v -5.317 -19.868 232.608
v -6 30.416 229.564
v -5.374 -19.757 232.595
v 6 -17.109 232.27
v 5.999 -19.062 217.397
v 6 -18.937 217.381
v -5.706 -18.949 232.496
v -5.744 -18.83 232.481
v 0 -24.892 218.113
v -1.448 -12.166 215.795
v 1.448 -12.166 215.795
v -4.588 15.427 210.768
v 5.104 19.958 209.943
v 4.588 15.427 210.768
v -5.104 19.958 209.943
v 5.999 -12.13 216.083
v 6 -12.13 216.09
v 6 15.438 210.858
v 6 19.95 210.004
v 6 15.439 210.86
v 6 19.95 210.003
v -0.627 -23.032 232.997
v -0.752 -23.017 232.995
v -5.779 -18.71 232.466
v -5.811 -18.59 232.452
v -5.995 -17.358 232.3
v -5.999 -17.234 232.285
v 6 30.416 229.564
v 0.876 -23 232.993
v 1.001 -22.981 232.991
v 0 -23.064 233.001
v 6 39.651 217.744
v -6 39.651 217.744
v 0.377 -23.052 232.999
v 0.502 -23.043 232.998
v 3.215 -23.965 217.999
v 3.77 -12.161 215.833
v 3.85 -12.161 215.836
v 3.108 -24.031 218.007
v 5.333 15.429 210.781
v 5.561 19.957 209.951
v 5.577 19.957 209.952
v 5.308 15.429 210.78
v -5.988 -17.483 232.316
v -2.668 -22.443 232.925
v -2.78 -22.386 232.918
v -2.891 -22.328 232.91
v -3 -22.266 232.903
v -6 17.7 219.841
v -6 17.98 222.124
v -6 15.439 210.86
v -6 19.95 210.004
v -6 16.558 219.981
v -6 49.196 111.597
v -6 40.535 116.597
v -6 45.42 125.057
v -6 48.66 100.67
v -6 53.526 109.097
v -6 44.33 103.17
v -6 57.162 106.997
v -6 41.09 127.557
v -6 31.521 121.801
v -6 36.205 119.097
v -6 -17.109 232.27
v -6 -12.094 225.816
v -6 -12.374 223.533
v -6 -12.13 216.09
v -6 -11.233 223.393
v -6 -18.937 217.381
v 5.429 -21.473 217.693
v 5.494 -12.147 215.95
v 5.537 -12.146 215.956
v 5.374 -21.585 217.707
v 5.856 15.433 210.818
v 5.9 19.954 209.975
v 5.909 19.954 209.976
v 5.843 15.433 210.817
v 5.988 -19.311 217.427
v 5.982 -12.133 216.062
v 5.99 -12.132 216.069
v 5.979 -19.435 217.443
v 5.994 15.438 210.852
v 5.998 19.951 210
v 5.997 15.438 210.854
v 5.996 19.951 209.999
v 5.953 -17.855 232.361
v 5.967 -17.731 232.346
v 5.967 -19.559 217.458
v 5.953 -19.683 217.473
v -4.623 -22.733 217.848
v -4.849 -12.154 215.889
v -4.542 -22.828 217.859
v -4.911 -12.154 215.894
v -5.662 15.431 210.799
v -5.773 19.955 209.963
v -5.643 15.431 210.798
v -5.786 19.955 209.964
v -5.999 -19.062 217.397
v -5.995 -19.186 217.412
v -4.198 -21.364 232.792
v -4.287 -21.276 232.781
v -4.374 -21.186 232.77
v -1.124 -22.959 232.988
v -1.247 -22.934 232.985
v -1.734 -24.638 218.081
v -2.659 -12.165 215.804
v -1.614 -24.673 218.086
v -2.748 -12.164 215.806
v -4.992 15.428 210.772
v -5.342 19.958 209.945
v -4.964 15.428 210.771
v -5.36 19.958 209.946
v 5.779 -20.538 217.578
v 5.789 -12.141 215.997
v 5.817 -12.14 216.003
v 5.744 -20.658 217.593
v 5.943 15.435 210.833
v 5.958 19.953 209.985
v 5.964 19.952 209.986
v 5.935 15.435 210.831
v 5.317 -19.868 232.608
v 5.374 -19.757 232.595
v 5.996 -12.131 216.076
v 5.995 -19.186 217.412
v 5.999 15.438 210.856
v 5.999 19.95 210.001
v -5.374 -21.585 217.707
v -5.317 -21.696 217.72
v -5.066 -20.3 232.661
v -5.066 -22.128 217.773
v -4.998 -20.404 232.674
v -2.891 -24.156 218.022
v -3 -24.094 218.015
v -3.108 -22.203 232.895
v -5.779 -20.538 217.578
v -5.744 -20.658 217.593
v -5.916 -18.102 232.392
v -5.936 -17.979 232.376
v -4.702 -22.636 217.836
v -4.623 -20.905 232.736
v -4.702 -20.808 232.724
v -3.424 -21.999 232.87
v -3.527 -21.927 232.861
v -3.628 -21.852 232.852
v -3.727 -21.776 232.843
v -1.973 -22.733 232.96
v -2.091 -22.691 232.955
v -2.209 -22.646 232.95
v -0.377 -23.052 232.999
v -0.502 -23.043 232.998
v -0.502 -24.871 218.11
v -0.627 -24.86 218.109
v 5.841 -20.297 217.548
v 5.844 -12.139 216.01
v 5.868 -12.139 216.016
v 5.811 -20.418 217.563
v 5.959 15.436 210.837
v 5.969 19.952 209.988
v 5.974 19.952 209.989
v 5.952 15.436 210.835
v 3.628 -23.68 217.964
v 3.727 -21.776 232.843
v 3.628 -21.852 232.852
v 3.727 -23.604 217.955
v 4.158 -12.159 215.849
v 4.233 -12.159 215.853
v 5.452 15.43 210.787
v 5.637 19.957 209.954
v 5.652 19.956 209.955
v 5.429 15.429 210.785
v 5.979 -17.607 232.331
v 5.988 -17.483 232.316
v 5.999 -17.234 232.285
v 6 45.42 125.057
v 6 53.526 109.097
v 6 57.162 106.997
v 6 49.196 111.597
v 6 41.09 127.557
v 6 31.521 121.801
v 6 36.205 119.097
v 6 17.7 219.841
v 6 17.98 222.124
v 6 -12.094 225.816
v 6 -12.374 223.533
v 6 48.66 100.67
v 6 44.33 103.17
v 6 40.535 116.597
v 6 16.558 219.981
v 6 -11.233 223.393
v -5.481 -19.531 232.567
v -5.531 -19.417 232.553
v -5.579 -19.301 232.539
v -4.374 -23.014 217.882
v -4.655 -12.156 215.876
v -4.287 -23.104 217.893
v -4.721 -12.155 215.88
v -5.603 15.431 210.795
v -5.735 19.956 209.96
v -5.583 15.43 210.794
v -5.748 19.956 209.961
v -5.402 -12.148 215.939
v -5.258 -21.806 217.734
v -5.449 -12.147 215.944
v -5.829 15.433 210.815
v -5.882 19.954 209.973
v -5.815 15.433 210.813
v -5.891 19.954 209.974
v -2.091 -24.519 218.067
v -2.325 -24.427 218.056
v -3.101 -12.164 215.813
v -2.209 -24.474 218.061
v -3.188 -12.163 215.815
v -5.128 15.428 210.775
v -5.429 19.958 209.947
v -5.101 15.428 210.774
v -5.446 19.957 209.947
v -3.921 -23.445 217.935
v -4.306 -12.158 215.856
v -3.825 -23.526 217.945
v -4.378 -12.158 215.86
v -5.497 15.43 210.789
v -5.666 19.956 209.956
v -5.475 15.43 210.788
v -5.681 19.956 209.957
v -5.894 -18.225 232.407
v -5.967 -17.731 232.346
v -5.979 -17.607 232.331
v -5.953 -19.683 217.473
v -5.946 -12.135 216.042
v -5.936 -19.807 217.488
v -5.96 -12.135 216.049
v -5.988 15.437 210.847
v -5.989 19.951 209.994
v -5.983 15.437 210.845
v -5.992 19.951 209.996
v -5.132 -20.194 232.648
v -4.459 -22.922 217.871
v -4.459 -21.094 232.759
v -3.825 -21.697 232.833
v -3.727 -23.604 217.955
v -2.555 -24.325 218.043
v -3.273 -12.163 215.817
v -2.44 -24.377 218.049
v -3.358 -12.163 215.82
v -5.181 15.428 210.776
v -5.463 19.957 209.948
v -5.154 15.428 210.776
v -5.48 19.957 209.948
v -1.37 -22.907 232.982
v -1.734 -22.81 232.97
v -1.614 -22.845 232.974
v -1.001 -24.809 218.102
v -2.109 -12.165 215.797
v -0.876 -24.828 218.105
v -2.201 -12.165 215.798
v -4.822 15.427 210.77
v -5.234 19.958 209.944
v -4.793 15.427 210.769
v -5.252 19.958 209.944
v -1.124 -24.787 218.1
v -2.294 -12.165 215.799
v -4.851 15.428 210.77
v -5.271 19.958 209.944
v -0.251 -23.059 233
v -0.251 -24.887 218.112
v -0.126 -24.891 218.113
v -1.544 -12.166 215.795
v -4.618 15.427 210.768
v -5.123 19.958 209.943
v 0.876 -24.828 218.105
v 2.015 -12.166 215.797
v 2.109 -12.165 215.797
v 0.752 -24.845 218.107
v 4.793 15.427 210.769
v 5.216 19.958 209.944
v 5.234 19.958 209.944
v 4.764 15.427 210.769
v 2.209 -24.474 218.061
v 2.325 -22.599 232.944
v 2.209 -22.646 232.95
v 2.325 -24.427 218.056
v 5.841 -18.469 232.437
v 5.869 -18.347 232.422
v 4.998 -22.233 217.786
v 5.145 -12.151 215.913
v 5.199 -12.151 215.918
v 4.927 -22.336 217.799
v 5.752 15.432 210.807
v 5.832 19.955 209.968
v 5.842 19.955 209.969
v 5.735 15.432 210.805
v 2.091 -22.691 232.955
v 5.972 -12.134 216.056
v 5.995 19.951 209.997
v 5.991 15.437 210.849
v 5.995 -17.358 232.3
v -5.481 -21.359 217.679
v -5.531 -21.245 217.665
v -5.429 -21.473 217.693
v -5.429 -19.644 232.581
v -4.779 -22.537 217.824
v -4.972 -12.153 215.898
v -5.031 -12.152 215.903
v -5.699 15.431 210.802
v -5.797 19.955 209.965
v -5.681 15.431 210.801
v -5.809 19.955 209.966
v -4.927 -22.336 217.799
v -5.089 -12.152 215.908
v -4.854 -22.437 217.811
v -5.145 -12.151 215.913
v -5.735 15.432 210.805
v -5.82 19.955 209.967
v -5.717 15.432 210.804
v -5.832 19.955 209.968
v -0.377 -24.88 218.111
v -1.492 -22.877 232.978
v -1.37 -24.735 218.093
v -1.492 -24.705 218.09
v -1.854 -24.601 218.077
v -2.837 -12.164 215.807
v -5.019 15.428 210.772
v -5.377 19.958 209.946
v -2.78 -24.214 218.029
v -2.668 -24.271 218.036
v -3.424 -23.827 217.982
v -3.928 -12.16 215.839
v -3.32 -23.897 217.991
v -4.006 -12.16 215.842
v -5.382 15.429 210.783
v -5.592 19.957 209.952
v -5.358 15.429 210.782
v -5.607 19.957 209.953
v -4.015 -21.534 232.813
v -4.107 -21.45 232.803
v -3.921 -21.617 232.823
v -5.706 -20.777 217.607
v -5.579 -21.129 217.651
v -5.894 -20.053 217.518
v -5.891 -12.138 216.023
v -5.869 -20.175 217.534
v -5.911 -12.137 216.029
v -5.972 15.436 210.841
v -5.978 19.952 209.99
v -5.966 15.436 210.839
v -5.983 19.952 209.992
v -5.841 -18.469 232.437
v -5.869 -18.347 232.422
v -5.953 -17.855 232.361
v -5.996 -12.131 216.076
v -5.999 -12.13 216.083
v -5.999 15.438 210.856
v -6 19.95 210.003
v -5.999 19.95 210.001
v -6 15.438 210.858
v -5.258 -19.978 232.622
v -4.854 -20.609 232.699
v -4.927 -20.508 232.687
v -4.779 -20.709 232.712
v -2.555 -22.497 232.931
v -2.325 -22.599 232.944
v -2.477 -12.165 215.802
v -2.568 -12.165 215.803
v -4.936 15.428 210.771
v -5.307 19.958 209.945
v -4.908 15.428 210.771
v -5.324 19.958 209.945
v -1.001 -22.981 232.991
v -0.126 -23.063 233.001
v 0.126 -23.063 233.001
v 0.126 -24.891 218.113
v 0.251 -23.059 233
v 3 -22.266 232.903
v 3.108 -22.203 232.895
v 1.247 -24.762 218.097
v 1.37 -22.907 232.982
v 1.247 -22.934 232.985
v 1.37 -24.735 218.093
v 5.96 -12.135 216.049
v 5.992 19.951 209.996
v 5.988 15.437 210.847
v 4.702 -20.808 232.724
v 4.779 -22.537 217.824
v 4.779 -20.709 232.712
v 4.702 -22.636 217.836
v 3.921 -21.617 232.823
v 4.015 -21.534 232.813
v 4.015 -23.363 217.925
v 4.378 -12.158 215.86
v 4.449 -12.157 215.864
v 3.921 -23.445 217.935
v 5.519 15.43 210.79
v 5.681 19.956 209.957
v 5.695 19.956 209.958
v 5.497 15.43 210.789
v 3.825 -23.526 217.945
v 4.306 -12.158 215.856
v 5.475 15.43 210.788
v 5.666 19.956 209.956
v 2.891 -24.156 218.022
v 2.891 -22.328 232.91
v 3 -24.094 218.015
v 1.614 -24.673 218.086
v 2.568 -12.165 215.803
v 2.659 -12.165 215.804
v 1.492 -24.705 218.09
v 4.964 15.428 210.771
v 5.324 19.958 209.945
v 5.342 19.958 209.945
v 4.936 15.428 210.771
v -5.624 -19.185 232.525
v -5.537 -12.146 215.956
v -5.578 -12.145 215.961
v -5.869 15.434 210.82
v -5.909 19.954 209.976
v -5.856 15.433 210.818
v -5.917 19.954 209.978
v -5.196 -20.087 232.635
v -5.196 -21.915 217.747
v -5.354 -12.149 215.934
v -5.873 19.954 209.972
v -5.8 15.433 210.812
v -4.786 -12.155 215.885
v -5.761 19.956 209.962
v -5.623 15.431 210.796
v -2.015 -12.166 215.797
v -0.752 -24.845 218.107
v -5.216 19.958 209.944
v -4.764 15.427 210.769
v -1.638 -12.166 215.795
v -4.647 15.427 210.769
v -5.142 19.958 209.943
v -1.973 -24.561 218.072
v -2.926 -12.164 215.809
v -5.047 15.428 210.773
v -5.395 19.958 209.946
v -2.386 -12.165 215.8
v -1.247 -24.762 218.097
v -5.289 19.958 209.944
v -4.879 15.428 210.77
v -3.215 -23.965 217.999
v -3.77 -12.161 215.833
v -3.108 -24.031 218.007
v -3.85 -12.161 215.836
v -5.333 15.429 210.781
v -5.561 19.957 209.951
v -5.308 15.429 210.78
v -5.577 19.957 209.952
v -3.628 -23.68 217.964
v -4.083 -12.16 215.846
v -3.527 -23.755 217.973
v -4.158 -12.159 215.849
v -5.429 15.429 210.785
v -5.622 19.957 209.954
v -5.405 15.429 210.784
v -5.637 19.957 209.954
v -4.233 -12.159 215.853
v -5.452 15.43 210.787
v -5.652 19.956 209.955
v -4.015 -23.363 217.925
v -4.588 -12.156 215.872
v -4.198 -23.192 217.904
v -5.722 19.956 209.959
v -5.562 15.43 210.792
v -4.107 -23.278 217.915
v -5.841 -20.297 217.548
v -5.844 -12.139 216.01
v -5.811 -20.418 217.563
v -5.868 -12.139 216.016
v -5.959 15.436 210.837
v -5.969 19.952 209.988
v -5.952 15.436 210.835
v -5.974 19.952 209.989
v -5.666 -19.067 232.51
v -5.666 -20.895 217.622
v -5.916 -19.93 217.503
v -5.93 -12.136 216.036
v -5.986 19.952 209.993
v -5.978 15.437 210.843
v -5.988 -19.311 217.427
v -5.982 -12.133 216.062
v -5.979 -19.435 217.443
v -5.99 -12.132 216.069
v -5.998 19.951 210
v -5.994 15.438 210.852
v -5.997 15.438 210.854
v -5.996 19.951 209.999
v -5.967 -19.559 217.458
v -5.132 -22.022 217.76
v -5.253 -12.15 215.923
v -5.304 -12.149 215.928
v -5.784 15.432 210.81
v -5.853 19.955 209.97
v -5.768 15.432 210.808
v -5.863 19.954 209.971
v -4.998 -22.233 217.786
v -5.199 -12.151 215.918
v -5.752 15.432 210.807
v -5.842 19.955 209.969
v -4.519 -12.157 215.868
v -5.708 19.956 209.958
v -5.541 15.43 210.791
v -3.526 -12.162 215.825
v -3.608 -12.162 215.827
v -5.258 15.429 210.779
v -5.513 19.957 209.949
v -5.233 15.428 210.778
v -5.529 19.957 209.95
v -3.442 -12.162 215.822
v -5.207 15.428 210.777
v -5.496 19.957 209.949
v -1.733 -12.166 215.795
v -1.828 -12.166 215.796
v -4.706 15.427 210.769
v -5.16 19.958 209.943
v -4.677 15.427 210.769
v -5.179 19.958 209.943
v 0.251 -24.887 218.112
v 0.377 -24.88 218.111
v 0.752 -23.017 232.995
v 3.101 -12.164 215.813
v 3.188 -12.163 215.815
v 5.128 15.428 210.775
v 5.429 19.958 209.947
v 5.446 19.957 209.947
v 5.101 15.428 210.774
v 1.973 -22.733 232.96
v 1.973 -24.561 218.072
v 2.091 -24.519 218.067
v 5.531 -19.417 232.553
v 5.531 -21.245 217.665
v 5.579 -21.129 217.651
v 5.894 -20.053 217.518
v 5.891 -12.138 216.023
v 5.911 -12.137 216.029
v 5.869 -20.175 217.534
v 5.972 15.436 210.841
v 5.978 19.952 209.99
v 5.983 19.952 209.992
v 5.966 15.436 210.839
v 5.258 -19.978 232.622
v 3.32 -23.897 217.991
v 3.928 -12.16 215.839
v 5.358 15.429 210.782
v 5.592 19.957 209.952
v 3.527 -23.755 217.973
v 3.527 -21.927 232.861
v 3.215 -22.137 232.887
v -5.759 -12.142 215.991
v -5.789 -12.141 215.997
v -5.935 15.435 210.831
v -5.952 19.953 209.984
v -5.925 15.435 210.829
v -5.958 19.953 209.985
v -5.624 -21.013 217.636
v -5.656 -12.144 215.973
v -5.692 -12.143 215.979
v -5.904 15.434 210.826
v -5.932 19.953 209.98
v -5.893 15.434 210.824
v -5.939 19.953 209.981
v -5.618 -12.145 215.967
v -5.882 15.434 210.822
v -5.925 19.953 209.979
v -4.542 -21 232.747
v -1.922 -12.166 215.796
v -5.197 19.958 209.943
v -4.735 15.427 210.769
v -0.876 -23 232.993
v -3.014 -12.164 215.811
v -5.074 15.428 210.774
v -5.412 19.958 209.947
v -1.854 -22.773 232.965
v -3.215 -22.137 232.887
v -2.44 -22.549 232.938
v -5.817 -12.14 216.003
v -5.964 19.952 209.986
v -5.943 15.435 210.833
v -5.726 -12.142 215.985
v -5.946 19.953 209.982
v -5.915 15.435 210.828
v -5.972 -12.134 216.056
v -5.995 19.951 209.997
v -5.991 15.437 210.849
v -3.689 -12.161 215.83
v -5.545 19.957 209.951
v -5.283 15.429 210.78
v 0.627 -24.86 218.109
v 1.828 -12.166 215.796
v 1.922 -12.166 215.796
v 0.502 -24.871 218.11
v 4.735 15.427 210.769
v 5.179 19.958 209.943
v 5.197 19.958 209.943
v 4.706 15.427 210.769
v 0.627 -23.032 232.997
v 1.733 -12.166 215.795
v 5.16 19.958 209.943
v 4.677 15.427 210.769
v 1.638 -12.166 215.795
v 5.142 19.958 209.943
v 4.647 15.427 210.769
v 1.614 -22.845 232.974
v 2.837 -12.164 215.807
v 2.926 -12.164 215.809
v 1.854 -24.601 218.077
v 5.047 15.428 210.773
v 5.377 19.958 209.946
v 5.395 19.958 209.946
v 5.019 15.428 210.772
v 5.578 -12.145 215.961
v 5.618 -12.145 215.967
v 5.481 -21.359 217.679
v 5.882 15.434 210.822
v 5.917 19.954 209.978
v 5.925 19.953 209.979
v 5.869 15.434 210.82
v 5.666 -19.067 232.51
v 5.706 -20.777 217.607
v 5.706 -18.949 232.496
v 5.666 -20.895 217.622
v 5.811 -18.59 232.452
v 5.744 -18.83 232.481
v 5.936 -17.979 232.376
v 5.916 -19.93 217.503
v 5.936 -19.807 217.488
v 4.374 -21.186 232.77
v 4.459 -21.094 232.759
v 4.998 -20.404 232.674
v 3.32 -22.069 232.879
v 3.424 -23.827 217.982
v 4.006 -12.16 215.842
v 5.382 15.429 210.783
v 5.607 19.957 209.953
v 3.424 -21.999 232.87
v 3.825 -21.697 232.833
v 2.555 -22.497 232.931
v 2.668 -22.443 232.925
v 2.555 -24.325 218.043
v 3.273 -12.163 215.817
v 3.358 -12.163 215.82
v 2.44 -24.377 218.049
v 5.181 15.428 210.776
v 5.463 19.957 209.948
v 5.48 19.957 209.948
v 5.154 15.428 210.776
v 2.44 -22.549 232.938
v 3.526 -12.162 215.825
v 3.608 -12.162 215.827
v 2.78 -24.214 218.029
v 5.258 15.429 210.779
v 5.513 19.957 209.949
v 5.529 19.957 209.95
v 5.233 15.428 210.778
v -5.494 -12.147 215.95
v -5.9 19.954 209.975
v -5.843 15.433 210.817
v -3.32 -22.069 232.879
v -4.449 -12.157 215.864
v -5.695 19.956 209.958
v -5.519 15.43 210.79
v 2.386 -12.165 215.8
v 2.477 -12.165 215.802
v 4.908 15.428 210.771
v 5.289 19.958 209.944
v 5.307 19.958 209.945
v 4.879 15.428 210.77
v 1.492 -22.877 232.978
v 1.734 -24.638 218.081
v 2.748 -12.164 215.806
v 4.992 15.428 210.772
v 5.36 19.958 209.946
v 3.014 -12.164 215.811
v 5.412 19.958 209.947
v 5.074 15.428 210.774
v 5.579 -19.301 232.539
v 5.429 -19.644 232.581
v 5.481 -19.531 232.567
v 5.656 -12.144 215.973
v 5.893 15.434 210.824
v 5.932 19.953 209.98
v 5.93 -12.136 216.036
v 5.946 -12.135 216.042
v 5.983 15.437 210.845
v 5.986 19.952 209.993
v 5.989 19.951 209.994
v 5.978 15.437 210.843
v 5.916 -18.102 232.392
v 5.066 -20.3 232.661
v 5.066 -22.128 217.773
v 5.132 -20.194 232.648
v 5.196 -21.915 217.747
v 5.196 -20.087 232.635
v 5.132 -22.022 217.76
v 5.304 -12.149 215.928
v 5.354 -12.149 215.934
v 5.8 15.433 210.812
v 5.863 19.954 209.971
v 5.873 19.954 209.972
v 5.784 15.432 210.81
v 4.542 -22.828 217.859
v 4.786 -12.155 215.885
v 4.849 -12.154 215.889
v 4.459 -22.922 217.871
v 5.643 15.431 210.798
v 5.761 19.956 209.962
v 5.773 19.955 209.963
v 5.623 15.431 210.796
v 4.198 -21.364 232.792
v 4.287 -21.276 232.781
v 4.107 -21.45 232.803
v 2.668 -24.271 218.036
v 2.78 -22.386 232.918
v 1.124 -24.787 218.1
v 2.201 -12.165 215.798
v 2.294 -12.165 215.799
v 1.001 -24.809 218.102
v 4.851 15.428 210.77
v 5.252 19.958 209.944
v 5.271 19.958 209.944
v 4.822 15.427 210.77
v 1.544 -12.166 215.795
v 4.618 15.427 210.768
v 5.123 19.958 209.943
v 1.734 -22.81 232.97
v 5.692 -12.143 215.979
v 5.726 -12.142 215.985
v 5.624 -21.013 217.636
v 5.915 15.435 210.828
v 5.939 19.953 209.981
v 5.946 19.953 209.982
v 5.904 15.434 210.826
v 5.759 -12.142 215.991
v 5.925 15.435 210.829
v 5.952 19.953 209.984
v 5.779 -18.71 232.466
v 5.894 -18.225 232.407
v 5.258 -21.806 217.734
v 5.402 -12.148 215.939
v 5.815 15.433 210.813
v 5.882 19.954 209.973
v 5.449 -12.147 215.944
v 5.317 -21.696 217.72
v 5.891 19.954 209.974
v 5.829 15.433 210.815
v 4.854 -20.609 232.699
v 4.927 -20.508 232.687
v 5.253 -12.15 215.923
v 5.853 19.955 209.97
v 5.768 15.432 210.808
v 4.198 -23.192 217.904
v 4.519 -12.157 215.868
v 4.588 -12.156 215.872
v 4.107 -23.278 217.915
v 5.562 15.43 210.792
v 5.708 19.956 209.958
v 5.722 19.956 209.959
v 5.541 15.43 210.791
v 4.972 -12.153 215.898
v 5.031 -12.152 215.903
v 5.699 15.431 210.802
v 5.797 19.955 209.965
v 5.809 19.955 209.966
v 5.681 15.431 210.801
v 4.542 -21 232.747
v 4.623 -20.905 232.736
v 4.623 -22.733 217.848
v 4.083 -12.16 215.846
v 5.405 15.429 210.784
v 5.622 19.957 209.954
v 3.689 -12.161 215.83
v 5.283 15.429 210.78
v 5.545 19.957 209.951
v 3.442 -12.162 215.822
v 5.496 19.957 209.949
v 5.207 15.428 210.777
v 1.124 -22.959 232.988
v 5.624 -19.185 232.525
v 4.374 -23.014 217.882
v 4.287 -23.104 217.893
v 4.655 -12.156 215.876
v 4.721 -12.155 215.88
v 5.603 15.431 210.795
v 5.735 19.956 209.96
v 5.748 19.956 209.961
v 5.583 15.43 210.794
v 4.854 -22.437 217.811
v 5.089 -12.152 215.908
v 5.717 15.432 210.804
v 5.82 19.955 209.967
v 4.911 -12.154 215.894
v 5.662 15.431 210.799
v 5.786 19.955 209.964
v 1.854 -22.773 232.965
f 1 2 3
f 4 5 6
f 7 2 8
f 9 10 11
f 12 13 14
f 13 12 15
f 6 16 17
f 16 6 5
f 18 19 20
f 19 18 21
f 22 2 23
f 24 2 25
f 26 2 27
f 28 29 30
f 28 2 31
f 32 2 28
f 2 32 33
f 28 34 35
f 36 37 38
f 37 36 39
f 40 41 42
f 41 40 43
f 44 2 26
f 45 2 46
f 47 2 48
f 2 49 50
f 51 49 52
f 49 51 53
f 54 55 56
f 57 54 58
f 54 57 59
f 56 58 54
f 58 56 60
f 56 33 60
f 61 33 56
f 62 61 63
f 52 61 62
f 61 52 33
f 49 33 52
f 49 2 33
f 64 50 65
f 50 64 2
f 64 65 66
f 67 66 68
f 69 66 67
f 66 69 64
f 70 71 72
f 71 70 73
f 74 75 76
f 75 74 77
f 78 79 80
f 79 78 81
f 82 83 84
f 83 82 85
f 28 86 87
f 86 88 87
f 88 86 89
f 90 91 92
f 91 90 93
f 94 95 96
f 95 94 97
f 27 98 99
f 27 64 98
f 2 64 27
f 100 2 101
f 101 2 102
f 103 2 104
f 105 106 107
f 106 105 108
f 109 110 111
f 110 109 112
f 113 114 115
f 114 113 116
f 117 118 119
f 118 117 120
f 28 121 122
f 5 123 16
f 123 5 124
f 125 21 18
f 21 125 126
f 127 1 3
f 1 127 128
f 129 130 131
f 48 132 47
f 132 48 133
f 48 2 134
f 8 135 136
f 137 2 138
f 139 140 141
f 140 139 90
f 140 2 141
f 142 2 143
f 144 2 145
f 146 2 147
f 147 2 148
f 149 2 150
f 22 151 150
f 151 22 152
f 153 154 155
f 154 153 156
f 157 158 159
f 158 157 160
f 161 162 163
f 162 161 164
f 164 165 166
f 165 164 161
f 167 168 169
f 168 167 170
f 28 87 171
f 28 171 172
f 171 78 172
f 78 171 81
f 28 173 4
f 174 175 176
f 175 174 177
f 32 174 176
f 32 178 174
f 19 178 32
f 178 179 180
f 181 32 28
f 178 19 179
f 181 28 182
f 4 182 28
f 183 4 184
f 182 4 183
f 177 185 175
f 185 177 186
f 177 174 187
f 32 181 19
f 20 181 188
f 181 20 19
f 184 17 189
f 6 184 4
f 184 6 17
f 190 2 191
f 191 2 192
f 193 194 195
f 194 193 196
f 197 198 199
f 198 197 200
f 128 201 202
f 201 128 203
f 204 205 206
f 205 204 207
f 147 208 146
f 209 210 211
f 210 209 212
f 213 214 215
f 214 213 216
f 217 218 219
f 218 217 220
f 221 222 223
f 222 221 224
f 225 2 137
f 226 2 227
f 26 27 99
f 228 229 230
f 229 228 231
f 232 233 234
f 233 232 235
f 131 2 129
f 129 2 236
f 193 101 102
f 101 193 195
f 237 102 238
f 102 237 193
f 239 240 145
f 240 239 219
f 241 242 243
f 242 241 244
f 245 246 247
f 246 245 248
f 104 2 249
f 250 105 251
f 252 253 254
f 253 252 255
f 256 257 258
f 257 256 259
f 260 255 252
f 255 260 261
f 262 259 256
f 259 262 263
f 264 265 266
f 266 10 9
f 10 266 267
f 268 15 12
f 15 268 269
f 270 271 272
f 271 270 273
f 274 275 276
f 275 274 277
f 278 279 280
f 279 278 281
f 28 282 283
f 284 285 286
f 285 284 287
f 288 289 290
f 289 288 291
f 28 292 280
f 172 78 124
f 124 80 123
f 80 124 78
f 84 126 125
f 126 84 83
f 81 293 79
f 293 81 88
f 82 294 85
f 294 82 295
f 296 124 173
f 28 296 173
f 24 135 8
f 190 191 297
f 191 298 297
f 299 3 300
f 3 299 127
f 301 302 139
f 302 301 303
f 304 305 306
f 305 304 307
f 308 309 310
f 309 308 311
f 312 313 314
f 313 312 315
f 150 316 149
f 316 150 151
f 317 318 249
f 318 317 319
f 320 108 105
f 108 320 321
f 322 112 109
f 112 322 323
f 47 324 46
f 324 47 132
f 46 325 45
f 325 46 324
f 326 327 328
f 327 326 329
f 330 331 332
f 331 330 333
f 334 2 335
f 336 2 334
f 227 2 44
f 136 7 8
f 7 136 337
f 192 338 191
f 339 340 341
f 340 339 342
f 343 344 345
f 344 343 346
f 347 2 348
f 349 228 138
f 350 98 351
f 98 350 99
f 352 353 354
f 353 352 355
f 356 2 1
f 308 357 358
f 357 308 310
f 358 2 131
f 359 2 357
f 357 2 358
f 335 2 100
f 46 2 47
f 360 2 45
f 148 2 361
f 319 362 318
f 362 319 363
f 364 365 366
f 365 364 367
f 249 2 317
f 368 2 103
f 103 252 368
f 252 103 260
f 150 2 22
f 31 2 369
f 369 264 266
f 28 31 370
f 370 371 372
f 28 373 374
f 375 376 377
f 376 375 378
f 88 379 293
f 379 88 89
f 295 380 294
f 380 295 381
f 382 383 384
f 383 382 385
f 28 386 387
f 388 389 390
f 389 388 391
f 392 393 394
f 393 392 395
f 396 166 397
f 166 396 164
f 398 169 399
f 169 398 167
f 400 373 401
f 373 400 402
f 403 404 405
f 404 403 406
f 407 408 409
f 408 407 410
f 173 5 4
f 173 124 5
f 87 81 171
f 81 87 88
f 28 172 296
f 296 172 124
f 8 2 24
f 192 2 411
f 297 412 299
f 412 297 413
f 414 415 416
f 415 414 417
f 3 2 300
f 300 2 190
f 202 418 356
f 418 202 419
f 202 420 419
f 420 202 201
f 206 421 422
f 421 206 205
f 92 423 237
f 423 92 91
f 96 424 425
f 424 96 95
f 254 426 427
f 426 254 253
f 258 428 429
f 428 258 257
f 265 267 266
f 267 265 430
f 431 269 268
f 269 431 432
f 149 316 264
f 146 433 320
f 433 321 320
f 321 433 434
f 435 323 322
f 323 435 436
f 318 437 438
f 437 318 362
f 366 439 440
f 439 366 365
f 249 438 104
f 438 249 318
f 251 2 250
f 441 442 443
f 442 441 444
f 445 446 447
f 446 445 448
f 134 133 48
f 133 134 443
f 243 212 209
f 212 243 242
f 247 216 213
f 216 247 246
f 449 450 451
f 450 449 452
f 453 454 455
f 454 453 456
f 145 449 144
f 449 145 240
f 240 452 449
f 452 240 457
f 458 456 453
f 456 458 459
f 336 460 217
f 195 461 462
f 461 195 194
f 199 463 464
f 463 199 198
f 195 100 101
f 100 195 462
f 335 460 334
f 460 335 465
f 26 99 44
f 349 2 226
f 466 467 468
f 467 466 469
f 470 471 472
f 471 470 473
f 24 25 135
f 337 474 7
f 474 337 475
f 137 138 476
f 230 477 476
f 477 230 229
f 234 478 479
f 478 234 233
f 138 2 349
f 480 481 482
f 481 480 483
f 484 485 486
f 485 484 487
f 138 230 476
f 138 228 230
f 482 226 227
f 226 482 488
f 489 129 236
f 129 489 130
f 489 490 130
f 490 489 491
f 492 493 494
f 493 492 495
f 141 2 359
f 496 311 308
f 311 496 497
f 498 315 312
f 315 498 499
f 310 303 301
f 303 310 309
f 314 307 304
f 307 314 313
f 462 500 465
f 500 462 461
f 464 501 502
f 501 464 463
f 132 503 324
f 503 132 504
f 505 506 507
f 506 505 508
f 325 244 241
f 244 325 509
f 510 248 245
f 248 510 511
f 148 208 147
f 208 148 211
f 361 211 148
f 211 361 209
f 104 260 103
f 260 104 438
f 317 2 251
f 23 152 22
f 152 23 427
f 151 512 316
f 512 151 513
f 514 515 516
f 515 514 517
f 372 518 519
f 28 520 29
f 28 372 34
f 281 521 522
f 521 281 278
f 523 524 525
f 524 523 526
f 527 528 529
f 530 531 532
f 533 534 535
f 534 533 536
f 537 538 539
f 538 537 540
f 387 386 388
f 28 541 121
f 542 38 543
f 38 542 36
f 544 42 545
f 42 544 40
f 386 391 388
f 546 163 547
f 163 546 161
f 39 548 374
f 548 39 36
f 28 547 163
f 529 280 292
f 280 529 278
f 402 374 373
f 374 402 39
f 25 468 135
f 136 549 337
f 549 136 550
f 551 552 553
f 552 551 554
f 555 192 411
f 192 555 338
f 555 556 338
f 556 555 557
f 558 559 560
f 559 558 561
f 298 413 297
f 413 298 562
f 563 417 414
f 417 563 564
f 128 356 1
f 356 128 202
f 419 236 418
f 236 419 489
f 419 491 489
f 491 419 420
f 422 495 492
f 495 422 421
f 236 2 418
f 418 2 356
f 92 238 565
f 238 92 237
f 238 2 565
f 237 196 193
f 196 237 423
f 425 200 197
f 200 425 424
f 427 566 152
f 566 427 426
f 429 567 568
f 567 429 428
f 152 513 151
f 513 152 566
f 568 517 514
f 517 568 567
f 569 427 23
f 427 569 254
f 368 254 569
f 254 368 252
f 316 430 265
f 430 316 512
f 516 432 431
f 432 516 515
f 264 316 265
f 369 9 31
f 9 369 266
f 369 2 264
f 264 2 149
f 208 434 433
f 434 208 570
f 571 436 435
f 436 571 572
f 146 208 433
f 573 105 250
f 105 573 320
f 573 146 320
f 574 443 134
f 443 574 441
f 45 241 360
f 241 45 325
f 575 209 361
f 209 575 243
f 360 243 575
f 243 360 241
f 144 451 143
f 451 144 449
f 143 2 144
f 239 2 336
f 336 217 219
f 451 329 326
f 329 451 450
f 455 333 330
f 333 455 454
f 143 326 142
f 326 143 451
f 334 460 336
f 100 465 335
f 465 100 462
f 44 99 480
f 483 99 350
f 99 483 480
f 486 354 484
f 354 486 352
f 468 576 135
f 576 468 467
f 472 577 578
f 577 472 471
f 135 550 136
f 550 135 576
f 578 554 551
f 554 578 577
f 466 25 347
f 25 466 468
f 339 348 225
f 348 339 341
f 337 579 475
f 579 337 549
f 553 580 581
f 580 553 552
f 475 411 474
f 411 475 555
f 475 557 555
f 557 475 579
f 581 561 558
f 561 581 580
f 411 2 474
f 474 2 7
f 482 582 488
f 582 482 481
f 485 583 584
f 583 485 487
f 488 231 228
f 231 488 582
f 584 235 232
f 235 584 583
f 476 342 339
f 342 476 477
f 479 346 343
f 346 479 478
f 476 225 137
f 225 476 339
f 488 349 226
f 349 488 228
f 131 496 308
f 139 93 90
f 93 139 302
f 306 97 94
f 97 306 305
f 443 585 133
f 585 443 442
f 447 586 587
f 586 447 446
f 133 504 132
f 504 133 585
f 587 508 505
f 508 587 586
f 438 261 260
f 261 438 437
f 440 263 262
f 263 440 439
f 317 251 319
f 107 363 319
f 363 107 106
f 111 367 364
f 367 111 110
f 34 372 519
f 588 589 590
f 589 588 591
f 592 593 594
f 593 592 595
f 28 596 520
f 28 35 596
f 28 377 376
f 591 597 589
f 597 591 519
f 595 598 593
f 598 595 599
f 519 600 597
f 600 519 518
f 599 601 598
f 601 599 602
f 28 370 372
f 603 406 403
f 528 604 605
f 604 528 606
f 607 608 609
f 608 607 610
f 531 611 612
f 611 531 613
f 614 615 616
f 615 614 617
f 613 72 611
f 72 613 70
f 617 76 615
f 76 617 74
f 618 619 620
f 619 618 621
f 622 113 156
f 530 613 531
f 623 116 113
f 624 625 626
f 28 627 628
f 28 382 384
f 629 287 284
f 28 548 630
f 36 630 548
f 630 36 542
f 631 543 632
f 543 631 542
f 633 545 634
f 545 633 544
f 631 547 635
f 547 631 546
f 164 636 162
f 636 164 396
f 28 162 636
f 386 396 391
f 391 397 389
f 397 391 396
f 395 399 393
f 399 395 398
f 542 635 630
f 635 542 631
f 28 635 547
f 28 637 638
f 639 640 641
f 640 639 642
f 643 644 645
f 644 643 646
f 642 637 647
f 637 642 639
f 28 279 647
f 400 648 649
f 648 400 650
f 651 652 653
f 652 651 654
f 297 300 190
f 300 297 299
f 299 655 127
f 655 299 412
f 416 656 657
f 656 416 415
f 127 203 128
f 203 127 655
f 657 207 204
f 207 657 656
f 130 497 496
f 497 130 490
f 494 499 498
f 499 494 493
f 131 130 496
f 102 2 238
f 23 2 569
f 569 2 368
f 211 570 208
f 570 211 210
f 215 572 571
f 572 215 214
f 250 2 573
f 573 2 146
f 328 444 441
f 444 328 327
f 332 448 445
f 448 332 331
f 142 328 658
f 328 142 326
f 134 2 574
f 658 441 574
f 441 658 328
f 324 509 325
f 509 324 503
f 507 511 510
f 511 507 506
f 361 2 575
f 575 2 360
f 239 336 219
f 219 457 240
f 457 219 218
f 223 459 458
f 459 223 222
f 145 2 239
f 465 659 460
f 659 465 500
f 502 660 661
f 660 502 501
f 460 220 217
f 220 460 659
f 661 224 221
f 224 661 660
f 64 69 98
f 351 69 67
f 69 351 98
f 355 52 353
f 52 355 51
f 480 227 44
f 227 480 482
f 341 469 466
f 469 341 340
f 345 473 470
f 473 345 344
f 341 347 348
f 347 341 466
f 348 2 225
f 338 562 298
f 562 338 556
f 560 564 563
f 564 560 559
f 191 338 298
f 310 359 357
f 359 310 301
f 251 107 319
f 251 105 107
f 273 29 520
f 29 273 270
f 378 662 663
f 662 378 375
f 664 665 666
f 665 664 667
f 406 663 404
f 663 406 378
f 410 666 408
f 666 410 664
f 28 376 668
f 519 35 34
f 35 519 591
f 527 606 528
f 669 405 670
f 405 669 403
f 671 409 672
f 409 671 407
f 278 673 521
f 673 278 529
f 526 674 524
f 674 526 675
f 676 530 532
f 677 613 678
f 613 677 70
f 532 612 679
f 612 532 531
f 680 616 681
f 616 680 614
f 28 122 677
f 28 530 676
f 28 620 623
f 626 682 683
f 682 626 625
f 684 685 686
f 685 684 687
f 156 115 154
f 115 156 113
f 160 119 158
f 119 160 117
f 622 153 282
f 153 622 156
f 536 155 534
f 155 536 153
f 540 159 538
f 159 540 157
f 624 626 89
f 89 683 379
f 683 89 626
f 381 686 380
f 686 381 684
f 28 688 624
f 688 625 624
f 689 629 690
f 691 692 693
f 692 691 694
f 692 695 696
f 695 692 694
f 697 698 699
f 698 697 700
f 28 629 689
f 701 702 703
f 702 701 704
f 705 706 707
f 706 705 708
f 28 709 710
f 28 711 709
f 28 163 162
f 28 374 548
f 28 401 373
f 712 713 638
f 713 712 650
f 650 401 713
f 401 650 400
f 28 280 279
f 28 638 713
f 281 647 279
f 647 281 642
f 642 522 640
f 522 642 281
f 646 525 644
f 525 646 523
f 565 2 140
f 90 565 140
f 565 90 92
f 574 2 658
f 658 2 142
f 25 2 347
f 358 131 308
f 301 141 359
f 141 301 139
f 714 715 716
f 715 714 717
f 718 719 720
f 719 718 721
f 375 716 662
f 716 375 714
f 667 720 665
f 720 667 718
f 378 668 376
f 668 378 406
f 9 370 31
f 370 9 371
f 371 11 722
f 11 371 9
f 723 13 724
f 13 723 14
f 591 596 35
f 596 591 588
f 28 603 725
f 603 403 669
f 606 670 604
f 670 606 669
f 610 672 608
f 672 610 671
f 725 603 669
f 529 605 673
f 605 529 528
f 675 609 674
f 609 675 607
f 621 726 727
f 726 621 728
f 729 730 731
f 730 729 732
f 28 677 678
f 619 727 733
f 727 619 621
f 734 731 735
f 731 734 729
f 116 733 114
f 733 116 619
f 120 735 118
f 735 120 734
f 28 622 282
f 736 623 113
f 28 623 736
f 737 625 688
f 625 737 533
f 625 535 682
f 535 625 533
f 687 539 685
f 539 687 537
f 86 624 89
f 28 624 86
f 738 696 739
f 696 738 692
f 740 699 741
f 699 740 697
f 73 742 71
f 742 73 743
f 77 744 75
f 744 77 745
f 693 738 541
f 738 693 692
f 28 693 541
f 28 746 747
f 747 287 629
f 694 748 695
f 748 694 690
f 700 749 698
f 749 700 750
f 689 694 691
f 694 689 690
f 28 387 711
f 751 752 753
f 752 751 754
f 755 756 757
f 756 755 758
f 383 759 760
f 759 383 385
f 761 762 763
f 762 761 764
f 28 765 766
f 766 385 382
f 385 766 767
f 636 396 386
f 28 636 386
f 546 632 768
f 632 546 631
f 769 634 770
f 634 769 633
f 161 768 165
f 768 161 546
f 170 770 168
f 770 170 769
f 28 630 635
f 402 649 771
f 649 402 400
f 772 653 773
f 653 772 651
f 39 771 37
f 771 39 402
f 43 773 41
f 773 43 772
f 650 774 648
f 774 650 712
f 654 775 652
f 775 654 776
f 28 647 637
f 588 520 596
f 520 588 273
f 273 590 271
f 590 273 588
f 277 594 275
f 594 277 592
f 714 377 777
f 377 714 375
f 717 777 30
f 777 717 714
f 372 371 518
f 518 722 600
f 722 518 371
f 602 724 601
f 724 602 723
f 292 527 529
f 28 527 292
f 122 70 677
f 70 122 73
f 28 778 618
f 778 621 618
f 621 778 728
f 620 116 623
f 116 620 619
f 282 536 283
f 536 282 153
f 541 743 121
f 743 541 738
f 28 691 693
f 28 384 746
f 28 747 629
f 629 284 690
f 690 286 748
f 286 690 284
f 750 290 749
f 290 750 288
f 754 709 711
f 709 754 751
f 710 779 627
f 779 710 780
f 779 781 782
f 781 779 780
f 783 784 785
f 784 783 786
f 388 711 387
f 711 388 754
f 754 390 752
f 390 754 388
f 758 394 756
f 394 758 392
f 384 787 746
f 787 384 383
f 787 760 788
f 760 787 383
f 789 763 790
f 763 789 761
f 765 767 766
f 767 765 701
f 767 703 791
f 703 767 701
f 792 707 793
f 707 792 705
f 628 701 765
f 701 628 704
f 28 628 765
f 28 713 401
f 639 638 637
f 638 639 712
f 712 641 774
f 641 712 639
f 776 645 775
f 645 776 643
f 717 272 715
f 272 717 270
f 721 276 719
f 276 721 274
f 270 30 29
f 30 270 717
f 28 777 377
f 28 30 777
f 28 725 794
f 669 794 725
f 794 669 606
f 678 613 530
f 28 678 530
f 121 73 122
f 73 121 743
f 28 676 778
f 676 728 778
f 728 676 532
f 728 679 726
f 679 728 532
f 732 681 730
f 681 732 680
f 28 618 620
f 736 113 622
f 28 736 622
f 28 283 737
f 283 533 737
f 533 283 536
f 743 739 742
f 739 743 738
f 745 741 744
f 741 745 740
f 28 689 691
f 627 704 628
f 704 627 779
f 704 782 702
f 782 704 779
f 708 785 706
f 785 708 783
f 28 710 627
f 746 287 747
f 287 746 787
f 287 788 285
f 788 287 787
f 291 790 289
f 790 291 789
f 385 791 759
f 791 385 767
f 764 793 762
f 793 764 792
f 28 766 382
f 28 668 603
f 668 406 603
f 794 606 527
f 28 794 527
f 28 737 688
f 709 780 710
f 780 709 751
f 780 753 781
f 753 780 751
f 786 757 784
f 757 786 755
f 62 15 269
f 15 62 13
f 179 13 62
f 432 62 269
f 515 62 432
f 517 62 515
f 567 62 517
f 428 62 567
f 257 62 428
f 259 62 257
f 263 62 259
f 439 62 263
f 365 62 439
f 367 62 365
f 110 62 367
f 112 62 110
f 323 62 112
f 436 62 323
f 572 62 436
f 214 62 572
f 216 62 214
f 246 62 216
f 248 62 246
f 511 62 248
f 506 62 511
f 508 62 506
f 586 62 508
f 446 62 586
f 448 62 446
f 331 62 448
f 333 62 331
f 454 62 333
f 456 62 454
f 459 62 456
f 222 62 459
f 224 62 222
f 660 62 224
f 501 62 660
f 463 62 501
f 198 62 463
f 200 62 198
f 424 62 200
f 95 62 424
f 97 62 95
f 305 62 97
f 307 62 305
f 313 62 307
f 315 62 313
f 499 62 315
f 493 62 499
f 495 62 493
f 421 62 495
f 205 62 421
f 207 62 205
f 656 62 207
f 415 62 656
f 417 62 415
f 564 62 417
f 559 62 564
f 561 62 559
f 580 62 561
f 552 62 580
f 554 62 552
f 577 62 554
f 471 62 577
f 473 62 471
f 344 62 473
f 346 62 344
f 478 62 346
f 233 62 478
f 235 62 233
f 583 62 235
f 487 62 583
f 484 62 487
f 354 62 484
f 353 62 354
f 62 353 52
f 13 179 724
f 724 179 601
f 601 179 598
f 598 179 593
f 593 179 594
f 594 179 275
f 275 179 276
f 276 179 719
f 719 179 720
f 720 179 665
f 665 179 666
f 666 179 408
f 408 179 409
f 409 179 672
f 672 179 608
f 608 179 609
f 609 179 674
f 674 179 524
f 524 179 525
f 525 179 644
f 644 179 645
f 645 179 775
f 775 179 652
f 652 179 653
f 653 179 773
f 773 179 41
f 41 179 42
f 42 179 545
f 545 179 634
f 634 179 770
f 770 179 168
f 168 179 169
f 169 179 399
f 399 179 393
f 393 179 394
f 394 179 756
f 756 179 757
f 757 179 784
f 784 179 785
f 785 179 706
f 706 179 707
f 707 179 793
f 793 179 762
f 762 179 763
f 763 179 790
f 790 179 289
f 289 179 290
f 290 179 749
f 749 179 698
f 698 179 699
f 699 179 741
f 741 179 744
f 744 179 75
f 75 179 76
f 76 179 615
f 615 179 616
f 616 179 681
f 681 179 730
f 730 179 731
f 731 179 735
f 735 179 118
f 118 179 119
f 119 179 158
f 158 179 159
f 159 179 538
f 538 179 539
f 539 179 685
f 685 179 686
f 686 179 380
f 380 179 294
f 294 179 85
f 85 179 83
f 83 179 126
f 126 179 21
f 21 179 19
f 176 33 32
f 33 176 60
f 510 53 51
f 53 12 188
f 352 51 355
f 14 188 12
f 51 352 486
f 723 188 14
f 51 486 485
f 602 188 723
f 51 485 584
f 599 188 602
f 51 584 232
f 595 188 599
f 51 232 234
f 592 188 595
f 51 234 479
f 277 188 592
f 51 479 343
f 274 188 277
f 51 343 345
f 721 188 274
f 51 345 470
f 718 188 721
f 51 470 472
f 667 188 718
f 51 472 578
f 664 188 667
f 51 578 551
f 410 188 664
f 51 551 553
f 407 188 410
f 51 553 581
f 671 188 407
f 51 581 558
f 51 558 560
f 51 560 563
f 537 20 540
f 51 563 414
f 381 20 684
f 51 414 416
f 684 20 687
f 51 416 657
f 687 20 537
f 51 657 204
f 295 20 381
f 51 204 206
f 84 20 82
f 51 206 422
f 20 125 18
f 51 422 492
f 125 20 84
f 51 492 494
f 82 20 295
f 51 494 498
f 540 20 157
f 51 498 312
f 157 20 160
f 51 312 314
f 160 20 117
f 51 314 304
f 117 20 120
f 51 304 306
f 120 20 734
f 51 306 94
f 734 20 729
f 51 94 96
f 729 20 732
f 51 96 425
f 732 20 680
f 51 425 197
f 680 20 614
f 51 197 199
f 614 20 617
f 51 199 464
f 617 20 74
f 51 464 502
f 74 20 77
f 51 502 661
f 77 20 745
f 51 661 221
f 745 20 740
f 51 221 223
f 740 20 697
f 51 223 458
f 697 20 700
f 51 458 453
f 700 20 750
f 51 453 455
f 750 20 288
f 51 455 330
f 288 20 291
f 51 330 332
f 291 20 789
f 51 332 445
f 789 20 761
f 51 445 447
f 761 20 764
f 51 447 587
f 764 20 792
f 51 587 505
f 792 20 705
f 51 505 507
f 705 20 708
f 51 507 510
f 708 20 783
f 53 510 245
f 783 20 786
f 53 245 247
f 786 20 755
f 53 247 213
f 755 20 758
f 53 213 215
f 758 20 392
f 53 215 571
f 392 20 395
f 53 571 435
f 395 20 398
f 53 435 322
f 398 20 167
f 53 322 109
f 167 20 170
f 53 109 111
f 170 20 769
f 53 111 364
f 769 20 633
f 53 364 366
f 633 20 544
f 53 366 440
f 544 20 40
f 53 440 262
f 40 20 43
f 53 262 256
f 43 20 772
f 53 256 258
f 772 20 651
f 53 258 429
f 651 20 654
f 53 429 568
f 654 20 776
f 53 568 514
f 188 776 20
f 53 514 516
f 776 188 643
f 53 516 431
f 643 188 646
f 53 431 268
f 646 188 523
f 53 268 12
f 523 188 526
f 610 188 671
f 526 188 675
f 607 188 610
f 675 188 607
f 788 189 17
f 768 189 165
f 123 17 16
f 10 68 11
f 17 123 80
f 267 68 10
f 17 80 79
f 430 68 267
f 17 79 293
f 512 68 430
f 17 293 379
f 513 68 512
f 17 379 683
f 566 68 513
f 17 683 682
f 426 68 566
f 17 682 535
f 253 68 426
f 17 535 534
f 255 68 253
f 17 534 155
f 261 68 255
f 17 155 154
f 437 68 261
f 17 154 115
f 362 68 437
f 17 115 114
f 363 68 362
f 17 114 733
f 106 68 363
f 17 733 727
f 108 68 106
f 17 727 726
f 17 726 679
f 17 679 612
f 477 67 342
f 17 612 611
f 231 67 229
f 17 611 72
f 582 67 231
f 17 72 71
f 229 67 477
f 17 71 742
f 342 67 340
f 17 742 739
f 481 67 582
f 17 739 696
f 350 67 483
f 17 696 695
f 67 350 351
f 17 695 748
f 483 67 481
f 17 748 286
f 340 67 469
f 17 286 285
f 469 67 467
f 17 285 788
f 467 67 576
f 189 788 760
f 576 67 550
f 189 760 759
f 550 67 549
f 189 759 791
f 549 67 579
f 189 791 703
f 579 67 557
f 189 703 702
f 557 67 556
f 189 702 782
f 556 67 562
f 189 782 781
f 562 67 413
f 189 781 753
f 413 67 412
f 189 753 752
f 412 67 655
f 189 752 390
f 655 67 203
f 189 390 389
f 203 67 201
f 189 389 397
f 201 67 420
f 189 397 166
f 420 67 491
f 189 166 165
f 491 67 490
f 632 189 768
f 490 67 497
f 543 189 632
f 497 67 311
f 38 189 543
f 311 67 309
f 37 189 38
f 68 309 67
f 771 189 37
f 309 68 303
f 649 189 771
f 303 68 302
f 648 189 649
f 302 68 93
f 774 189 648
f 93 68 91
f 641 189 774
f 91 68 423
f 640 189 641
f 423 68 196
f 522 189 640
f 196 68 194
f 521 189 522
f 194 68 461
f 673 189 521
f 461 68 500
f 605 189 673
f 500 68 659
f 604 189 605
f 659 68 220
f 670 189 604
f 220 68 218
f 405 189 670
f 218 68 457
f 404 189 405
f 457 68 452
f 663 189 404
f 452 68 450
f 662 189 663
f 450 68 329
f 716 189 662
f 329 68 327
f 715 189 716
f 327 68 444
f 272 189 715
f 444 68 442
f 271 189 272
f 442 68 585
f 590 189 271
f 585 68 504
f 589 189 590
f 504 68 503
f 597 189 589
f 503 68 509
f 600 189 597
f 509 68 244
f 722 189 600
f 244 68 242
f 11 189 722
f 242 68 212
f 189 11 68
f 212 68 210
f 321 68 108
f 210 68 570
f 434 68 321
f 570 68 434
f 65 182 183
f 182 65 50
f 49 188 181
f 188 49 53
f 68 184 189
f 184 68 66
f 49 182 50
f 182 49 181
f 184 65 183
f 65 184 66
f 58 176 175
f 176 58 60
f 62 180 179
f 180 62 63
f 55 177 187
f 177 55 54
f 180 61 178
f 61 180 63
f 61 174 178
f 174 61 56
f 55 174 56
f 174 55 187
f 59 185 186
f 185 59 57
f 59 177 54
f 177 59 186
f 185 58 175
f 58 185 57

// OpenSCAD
$fn=100;

if($preview){
  translate([0,100,0])torii();
  translate([0,-100,0])street();
}else{
  // Put parts for 3D printing here and press F6
  $fn=300;
  cutter(1,140,-30);
}

// Assemblies
// Streetlamp style stand
module street(){
  color("Gainsboro")translate([0,0,200])rotate([-7,0,0])rolfstorp();
  for(i=[-1:2:1]){
    color("DarkOliveGreen")translate([140*i,0,0])street_stand();
  }
}

// Torii style stand
module torii(){
  color("Gainsboro")translate([0,0,120])rolfstorp();
  for(i=[-1:2:1]){
    color("MediumVioletRed")translate([140*i,0,0])torii_stand();
  }
}

// Helper
// 3D print splitter
module cutter(side=0,cuth=0,cuta=0){
  difference(){
  street_stand();
    union(){
      translate([0,0,cuth])rotate([cuta+180*side,0,0])translate([-500/2,-500/2,0])cube([500,500,500]);
    }
    translate([-12/2,40+5/2,cuth-30])rotate([cuta+180*side,0,0])translate([0,5,-5-9.5*side])cube([12,5,10]);
  }
  translate([-12/2,40+5/2,cuth-30])rotate([cuta+180*side,0,0])translate([0,-10,4.5-9.5*side])cube([12,5,10]);
}

// Parts
// Steetlamp style
module street_stand(){
  t=12;
  h=200;
  difference(){
    union(){
      // upper body
      hull(){
        translate([0,0,h+15/2])rotate([-7,0,0])translate([0,0,15])cube([t,40,15],center=true);
        translate([0,0,h+15/2])rotate([-7,0,0])translate([0,-20,7.5])cylinder(d=t,h=15);
        translate([0,0,h+15/2])rotate([-7,0,0])translate([0,40/2+15/2,15])rotate([-45,0,0])cube([t,15,15],center=true);
      }
      // neck
      hull(){
        translate([0,0,h+15/2])rotate([-7,0,0])translate([0,40/2+15/2,15])rotate([-45,0,0])cube([t,15,15],center=true);
        translate([0,60,10/2])cube([t,25,10],center=true);
      }
      hull(){
        translate([0,-5,0])cylinder(d=t,h=10);
        translate([0,80,0])cylinder(d=t,h=10);
      }
    }union(){
      // upper body cutout
      translate([0,0,h])rotate([-7,0,0])union(){
        translate([0,0,24/2])cube([t+2,28,24.1],center=true);
        translate([0,0,-2/2+24])cube([t+2,30.3,2.3],center=true);
      }
      for(i=[-1:2:1]){
        translate([0,i*177/2+10*i,14/2+h+15+5])rotate([i*-10,0,0])cube([t+2,20,32],center=true);
      }
    }
  }
}

// Torii style
module torii_stand(){
  t=25;
  h=120;
  difference(){
    union(){
      // upper body
      translate([0,0,8/2+h])cube([t,170,8],center=true);
      translate([0,0,14/2+h+15])cube([t,170,14],center=true);
      for(i=[-1:2:1]){
        translate([0,i*65/2+22*i,14/2+h+15+5])rotate([i*5,0,0])cube([t,90,10],center=true);
        translate([0,17*i,h+11.5])cube([t,6,9],center=true);
      }
      translate([0,0,14/2+h+15])cube([t,200,14],center=true);
      // stands
      for(i=[-1:2:1]){
        translate([0,55*i,(h+15)/2])cube([t,12,h+15],center=true);
        translate([0,55*i,8/2])cube([t,36,8],center=true);
      }
    }union(){
      // upper body cutout
      translate([0,0,24/2+h])cube([t+2,28,24.1],center=true);
      translate([0,0,-2/2+h+24])cube([t+2,30.1,2.1],center=true);
      for(i=[-1:2:1]){
        translate([0,i*177/2+10*i,14/2+h+15+5])rotate([i*-10,0,0])cube([t+2,20,32],center=true);
      }
    }
  }
}

// Lamp
module rolfstorp(){
  intersection(){
    union(){
      // body
      translate([0,0,24/2])cube([340,27.5,24],center=true);
      for(i=[-1:2:1]){
        translate([i*340/2,0,0])cylinder(d=27.5,h=24);
      }
      //rim
      translate([0,0,24-2/2])cube([340,30,2],center=true);
      for(i=[-1:2:1]){
        translate([i*340/2,0,24-2])cylinder(d=30,h=2);
      }
    }
    translate([8,0,24/2])cube([380,32,32],center=true);
    }
}
